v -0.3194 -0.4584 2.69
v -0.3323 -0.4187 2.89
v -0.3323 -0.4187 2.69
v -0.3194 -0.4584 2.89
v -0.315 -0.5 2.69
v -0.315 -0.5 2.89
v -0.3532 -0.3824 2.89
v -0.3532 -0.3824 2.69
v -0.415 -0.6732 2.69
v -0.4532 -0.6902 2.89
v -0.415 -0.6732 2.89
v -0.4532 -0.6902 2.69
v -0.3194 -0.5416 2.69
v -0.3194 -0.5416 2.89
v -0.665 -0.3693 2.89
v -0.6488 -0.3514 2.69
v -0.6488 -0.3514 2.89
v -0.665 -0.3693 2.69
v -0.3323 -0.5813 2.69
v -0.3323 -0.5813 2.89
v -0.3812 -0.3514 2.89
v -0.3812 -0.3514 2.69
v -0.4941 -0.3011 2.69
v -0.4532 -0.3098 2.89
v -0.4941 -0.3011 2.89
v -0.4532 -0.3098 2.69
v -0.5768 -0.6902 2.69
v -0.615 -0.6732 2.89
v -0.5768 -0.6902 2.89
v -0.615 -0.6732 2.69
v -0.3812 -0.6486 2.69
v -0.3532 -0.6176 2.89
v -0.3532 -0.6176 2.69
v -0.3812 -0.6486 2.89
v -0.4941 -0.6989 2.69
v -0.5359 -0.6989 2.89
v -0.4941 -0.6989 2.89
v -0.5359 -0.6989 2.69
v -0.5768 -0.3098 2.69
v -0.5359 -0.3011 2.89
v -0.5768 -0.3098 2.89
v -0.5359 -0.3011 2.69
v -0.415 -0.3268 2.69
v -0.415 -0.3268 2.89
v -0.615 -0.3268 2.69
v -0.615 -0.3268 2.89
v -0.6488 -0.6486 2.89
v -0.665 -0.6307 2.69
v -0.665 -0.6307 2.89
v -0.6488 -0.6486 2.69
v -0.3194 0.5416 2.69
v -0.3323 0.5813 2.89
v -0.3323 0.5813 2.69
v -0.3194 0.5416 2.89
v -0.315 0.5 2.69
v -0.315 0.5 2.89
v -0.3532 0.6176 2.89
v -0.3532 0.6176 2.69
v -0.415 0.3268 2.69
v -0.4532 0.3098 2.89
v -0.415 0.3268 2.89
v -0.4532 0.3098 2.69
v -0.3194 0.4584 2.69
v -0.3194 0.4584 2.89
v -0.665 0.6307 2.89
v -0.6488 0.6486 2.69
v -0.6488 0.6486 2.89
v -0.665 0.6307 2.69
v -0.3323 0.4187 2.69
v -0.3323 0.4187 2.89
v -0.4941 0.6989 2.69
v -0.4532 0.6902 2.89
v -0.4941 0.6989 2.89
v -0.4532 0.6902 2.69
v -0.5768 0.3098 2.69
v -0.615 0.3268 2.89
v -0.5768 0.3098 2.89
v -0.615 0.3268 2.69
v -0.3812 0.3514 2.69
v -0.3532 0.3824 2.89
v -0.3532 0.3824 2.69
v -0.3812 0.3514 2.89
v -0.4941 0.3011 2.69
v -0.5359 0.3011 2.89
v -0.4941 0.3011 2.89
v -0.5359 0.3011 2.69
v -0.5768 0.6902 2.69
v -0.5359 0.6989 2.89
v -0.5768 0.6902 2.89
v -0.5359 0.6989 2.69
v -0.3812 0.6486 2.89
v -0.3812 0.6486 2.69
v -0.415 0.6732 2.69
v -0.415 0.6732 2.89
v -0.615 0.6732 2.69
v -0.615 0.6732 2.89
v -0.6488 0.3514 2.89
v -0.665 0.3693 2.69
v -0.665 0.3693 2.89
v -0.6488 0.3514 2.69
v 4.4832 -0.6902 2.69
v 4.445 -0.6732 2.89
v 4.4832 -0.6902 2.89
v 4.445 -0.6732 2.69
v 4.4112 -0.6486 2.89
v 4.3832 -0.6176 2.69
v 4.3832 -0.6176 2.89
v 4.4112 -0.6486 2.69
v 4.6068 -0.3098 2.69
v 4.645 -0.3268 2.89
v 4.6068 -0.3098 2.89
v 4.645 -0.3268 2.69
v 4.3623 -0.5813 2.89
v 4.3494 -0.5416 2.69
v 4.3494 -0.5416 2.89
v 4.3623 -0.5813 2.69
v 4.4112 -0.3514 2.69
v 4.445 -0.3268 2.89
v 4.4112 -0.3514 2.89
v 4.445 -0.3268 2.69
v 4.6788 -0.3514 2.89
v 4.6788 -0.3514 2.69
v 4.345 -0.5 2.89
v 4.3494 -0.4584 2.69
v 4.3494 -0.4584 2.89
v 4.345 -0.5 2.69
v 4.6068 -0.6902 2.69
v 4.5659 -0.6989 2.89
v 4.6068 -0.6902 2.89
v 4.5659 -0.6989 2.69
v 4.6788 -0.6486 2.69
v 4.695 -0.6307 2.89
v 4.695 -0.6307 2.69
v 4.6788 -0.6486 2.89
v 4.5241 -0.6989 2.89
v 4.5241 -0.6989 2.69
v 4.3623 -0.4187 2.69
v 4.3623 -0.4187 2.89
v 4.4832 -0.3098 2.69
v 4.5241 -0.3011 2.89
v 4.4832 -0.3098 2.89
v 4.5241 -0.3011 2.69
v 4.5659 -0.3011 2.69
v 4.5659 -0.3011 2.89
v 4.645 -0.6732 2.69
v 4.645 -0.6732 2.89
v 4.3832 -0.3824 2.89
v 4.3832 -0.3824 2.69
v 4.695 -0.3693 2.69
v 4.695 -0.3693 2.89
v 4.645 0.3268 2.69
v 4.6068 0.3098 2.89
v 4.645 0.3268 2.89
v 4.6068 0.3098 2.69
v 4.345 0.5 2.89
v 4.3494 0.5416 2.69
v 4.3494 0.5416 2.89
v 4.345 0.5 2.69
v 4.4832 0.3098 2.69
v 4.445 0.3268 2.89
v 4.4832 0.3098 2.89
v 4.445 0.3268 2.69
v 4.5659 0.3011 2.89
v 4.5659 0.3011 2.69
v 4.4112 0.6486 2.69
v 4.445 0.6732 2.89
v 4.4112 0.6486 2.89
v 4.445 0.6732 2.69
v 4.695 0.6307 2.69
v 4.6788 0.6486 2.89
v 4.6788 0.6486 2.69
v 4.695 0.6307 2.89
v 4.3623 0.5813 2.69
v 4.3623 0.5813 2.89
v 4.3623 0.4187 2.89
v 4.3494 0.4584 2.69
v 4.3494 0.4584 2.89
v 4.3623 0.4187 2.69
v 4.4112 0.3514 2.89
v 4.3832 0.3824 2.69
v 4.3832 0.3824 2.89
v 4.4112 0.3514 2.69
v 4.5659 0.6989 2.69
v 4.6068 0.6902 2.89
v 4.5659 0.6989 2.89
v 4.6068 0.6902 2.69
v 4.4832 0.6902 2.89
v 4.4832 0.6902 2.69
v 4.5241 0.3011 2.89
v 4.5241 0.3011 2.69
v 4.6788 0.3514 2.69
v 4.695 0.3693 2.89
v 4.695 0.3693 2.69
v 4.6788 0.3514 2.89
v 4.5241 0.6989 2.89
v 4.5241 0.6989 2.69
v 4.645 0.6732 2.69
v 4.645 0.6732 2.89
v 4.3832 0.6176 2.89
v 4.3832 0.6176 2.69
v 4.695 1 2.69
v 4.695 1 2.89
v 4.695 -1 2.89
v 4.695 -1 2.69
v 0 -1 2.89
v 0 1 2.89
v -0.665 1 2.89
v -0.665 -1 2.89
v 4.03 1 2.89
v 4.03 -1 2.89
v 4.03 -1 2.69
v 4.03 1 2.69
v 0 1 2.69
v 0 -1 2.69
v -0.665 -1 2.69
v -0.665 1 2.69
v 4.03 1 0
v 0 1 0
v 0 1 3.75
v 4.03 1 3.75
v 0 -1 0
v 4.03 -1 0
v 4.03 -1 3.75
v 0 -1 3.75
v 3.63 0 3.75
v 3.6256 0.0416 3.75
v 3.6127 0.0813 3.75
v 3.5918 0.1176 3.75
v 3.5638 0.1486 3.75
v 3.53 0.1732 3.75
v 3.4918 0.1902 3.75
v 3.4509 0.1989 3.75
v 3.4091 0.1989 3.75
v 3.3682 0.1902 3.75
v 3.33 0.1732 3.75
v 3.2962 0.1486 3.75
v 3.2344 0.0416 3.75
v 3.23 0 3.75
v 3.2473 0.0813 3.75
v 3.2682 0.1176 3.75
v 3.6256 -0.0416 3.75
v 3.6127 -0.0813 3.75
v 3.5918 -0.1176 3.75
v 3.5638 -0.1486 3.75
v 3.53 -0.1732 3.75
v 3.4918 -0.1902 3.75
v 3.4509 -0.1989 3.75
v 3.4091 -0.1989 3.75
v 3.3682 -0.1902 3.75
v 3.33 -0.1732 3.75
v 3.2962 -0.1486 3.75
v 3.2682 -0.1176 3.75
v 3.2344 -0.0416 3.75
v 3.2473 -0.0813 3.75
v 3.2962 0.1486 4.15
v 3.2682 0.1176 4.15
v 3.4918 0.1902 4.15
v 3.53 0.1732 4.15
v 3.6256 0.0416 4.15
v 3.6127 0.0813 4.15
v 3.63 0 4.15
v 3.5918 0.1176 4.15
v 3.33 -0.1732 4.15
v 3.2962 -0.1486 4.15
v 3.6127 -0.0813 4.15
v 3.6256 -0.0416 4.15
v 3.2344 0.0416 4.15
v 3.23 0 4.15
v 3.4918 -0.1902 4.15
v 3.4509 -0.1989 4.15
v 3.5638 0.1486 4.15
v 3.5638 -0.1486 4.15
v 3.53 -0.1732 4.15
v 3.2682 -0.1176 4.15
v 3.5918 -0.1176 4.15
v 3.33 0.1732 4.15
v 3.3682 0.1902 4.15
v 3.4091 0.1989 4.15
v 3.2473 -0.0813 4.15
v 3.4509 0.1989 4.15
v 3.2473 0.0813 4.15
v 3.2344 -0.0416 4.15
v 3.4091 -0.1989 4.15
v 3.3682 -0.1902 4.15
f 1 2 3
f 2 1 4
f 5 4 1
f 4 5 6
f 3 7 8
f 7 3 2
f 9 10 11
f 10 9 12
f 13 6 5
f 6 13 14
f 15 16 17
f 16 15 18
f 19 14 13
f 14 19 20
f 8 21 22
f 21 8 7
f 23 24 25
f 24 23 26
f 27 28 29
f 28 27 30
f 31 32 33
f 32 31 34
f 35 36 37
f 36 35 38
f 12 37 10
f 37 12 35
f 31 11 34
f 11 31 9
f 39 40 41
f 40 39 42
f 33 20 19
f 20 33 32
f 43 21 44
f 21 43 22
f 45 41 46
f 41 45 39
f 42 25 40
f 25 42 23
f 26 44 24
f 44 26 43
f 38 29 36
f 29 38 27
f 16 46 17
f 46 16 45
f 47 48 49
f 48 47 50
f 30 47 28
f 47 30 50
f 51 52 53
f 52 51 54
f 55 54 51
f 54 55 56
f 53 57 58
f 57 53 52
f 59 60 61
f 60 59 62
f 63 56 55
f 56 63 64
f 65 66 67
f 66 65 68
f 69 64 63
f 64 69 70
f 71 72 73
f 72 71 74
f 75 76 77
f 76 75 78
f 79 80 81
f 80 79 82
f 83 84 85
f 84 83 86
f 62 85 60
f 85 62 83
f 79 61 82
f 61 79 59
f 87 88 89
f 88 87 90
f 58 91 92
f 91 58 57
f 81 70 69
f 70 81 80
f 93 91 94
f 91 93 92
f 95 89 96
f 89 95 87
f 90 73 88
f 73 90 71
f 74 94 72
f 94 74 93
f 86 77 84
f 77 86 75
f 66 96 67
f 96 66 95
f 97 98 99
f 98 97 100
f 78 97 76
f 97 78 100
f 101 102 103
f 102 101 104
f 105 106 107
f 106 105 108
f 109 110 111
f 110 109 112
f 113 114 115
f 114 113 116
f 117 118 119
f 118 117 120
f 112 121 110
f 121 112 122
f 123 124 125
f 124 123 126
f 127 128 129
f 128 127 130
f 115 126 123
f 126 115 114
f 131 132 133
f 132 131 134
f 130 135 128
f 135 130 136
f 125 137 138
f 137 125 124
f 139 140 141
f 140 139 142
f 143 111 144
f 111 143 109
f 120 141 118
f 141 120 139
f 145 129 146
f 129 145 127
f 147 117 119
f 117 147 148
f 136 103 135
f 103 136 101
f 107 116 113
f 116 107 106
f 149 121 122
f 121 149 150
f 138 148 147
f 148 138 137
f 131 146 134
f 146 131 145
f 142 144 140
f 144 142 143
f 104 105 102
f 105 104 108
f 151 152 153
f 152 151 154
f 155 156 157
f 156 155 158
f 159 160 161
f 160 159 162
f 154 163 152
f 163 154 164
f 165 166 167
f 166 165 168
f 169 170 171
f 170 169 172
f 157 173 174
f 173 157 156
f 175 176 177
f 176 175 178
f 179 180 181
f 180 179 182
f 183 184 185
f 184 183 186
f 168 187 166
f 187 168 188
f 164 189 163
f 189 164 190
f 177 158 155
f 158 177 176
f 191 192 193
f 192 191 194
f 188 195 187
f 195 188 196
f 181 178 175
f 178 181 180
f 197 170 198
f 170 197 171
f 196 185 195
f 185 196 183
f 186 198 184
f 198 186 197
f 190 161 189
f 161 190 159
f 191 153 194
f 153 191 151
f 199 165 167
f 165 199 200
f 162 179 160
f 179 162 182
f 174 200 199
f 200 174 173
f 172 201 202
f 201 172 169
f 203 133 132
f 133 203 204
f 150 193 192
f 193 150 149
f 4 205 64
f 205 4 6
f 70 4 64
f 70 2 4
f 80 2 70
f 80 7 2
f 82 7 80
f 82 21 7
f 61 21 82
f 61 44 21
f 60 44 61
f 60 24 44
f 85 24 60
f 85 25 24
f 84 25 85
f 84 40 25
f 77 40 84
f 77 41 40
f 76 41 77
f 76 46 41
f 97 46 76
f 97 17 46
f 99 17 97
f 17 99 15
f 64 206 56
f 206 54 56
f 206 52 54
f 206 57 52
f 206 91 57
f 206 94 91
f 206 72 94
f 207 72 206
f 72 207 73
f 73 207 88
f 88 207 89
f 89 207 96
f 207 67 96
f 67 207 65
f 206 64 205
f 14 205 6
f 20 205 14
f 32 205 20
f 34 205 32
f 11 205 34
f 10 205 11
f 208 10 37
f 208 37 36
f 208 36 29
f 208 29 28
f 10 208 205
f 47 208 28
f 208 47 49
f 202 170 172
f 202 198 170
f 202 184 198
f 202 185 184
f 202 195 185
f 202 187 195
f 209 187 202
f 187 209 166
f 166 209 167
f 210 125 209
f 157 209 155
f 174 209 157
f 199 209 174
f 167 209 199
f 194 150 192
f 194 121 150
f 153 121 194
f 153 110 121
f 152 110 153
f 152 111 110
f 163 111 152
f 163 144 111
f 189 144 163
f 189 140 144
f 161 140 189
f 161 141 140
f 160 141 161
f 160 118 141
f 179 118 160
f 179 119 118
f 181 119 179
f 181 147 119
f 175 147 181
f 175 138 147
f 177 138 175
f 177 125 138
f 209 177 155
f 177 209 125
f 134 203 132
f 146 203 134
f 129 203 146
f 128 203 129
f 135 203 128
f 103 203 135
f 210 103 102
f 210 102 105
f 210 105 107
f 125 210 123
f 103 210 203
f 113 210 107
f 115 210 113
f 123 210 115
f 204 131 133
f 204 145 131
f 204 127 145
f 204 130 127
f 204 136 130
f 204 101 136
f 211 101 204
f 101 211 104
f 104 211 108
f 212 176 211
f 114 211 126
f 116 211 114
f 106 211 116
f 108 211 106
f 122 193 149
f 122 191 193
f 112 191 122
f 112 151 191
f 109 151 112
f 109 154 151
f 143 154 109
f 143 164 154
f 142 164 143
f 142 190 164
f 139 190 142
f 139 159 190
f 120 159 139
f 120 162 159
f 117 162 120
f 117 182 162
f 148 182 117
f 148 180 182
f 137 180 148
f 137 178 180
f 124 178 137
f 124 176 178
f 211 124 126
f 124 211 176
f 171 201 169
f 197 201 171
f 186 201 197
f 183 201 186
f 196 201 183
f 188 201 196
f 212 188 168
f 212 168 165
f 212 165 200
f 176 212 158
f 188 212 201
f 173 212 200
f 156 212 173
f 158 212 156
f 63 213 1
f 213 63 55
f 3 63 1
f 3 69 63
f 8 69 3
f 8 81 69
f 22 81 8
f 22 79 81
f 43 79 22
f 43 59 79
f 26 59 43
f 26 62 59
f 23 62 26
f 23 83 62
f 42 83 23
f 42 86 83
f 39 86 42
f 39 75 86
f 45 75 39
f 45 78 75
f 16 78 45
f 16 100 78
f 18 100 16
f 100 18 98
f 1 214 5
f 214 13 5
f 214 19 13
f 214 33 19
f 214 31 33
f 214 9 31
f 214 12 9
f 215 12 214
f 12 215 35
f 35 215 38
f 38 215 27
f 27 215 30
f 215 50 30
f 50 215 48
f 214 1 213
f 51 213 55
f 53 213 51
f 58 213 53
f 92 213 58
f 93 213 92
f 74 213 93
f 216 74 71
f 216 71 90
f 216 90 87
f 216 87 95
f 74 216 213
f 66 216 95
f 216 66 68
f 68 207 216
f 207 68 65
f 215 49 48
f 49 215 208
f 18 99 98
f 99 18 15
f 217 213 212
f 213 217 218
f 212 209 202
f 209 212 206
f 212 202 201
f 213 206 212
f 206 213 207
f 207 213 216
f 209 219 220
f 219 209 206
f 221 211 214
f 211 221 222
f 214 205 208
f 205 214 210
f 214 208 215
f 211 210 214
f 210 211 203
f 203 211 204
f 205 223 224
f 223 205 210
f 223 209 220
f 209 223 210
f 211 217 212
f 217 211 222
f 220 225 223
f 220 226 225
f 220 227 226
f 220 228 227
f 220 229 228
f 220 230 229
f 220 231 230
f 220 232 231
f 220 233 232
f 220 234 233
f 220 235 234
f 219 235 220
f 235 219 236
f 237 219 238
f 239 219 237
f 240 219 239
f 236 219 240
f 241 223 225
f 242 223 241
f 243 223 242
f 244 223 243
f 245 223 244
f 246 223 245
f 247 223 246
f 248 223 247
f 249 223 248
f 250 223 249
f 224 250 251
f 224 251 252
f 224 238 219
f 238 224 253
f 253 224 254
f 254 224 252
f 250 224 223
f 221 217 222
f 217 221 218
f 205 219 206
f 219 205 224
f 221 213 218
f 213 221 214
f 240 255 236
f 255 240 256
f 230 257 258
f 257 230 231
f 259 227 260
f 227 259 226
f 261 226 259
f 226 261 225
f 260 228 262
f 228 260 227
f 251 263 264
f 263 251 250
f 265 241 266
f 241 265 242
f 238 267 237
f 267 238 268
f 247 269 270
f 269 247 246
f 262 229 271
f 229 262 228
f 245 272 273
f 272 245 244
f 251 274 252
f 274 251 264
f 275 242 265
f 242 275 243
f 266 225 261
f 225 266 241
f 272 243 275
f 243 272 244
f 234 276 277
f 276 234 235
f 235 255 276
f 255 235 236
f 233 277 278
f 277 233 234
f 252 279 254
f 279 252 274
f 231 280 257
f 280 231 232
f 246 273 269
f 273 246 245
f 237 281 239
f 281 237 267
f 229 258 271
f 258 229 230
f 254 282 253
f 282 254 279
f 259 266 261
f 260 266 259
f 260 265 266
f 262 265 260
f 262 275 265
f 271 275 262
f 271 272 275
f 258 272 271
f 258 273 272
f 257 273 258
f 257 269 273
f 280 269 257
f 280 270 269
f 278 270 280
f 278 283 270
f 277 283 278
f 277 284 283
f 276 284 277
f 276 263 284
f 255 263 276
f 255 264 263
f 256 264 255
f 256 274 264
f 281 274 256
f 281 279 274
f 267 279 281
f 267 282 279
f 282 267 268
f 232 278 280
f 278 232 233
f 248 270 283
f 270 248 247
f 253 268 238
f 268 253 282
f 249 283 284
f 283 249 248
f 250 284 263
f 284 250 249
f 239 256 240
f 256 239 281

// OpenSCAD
$fn = 30;

module mg996rServo() {
	flange_width = 5.36;
	flange_height_offset = 2.69;
	flange_height = 0.2;
	main_width = 4.03;
	depth = 2;
	height = 3.75;

  translate([0,-depth/2,0]){
			cube([main_width, depth, height]);
			translate([main_width/2-flange_width/2,0,flange_height_offset]) {
				difference() {
					cube([flange_width, depth, flange_height]);
					translate([0,depth/2,-0.25]) {
						translate([0.15,-0.5,0]) cylinder(d=0.4, h=0.5);
						translate([0.15,0.5,0]) cylinder(d=0.4, h=0.5);
						translate([flange_width - 0.15,-0.5,0]) cylinder(d=0.4, h=0.5);
						translate([flange_width - 0.15,0.5,0]) cylinder(d=0.4, h=0.5);
					}
				}
			}
		translate([3.43, depth/2, height]) color("orange") cylinder(r=0.2, h=0.4);
	}
}
mg996rServo();
